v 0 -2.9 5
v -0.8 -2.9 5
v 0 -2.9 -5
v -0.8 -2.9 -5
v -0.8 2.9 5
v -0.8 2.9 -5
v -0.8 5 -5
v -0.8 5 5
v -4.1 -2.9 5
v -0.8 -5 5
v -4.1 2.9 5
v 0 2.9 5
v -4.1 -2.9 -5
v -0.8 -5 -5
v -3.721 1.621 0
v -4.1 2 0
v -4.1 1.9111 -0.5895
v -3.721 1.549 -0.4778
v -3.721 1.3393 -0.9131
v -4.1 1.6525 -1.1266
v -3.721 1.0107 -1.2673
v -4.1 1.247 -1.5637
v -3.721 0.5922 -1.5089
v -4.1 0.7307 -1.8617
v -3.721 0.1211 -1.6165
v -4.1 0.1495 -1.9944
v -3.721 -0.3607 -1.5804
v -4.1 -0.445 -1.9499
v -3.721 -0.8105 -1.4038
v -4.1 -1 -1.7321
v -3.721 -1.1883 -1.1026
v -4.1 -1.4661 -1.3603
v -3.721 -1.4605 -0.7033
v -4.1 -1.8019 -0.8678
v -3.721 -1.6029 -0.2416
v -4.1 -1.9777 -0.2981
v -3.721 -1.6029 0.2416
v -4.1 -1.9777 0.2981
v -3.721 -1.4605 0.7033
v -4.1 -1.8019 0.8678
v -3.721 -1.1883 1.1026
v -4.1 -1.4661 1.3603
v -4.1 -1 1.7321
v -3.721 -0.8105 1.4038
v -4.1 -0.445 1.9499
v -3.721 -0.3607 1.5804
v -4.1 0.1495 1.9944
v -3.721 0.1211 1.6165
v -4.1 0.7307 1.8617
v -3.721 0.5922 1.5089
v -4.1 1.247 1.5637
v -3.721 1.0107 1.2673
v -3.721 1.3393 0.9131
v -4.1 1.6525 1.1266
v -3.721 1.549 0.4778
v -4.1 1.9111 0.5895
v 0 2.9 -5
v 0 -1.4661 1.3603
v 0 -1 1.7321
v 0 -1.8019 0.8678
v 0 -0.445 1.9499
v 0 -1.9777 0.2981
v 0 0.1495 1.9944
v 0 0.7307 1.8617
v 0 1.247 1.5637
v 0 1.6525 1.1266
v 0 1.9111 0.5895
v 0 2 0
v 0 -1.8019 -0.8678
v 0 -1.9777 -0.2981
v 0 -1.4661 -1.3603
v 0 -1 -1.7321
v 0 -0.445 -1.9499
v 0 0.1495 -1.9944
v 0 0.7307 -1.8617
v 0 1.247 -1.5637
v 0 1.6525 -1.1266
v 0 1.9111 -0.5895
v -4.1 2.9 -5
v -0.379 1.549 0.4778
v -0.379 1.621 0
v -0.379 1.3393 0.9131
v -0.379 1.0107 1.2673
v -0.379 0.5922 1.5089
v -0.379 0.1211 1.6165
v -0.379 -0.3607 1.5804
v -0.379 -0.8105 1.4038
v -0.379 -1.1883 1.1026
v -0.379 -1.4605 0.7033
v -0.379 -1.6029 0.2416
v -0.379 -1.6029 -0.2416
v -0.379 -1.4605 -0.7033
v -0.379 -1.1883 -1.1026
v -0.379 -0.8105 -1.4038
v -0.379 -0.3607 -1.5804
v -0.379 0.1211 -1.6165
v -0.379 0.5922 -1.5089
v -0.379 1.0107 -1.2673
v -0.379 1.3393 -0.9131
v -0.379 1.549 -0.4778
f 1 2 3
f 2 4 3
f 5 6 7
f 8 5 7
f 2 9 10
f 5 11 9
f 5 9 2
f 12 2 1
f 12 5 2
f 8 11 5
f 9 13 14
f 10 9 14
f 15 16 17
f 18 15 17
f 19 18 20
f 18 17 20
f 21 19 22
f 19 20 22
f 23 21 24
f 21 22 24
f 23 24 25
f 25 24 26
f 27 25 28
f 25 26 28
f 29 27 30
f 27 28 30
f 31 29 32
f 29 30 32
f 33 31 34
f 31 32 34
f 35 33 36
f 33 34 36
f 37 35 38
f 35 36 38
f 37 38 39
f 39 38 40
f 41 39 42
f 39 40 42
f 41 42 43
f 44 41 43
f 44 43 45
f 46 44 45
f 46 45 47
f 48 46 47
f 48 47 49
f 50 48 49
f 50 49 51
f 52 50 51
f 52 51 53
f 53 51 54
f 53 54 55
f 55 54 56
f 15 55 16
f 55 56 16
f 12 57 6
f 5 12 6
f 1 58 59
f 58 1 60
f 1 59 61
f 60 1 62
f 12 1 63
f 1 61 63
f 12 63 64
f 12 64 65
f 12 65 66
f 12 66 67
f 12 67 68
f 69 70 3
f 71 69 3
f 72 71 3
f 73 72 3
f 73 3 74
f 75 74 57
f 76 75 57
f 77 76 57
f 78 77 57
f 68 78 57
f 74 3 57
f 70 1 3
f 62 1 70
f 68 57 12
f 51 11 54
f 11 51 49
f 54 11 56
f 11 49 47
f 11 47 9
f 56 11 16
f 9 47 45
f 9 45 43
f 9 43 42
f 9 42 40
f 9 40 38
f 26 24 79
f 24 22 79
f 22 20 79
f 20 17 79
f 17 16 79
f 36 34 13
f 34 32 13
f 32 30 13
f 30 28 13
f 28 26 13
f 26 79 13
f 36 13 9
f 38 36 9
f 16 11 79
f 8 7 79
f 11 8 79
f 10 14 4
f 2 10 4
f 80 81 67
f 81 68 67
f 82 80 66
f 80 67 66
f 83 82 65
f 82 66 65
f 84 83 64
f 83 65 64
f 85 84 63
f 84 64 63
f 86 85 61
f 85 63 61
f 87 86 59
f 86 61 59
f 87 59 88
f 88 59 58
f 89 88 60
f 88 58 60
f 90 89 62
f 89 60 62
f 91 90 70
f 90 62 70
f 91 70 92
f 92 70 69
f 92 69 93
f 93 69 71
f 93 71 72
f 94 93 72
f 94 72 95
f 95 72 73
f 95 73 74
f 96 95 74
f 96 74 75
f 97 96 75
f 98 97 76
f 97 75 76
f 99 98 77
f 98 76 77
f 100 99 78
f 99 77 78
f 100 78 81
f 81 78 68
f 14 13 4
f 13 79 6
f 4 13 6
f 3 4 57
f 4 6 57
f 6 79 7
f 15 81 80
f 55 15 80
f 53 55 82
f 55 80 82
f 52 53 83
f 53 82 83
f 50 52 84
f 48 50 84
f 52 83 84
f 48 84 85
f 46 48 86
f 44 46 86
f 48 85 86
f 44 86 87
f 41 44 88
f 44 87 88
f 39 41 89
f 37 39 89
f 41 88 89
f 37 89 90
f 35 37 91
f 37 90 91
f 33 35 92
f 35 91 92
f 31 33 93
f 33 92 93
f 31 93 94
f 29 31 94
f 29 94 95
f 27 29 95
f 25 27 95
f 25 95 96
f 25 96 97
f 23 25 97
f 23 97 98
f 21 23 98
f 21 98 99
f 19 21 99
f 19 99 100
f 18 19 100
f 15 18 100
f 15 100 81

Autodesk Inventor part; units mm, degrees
sketch "Sketch_4" plane through (0, 0, 0) normal (0, 0, 1) x (1, 0, 0)
  line L0 (-4.1, 2.9) -> (-4.1, -2.9)
  line L1 (-4.1, -2.9) -> (-0.8, -5)
  line L2 (-0.8, -5) -> (-0.8, -2.9)
  line L3 (-0.8, -2.9) -> (0, -2.9)
  line L4 (0, -2.9) -> (0, 2.9)
  line L5 (0, 2.9) -> (-0.8, 2.9)
  line L6 (-0.8, 2.9) -> (-0.8, 5)
  line L7 (-0.8, 5) -> (-4.1, 2.9)
extrude "Extrusion1" add sketch "Sketch_4" along normal mid plane 10
sketch "Sketch_5" plane through (0, 0, 0) normal (0, 0, 1) x (1, 0, 0)
  line L0 (0, 0) -> (-4.1, 0)
  line L1 (-4.1, 0) -> (-4.1, 2)
  line L2 (-4.1, 2) -> (-3.721, 1.621)
  line L3 (-3.721, 1.621) -> (-0.379, 1.621)
  line L4 (-0.379, 1.621) -> (0, 2)
  line L5 (0, 2) -> (0, 0)
  line L6 (0, 0) -> (-4.1, 0)
revolve "Revolution1" cut sketch "Sketch_5" angle 360 about axis through (0, 0, 0) along (1, 0, 0)
thread "Thread1" size "M4x0.7" class "6H" standard "ISO Metric profile" full length
ref_plane "nut_XY" through (0, 0, 0) normal (1, 0, 0) x (0, 0, -1)
ref_plane "nut_YZ" through (0, 0, 0) normal (0, 0, -1) x (0, 1, 0)
ref_plane "nut_ZX" through (0, 0, 0) normal (0, 1, 0) x (1, 0, 0)
ref_plane "to_bolt_XY" through (-4.1, 0, 0) normal (1, 0, 0) x (0, 0, -1)
ref_plane "to_bolt_YZ" through (-4.1, 0, 0) normal (0, 0, -1) x (0, 1, 0)
ref_plane "to_bolt_ZX" through (-4.1, 0, 0) normal (0, 1, 0) x (1, 0, 0)
ref_plane "to_frames_XY" through (-0.8, 0, 0) normal (1, 0, 0) x (0, 0, -1)
ref_plane "to_frames_YZ" through (-0.8, 0, 0) normal (0, 0, -1) x (0, 1, 0)
ref_plane "to_frames_ZX" through (-0.8, 0, 0) normal (0, 1, 0) x (1, 0, 0)
properties part number "HNTT5-4_1"
